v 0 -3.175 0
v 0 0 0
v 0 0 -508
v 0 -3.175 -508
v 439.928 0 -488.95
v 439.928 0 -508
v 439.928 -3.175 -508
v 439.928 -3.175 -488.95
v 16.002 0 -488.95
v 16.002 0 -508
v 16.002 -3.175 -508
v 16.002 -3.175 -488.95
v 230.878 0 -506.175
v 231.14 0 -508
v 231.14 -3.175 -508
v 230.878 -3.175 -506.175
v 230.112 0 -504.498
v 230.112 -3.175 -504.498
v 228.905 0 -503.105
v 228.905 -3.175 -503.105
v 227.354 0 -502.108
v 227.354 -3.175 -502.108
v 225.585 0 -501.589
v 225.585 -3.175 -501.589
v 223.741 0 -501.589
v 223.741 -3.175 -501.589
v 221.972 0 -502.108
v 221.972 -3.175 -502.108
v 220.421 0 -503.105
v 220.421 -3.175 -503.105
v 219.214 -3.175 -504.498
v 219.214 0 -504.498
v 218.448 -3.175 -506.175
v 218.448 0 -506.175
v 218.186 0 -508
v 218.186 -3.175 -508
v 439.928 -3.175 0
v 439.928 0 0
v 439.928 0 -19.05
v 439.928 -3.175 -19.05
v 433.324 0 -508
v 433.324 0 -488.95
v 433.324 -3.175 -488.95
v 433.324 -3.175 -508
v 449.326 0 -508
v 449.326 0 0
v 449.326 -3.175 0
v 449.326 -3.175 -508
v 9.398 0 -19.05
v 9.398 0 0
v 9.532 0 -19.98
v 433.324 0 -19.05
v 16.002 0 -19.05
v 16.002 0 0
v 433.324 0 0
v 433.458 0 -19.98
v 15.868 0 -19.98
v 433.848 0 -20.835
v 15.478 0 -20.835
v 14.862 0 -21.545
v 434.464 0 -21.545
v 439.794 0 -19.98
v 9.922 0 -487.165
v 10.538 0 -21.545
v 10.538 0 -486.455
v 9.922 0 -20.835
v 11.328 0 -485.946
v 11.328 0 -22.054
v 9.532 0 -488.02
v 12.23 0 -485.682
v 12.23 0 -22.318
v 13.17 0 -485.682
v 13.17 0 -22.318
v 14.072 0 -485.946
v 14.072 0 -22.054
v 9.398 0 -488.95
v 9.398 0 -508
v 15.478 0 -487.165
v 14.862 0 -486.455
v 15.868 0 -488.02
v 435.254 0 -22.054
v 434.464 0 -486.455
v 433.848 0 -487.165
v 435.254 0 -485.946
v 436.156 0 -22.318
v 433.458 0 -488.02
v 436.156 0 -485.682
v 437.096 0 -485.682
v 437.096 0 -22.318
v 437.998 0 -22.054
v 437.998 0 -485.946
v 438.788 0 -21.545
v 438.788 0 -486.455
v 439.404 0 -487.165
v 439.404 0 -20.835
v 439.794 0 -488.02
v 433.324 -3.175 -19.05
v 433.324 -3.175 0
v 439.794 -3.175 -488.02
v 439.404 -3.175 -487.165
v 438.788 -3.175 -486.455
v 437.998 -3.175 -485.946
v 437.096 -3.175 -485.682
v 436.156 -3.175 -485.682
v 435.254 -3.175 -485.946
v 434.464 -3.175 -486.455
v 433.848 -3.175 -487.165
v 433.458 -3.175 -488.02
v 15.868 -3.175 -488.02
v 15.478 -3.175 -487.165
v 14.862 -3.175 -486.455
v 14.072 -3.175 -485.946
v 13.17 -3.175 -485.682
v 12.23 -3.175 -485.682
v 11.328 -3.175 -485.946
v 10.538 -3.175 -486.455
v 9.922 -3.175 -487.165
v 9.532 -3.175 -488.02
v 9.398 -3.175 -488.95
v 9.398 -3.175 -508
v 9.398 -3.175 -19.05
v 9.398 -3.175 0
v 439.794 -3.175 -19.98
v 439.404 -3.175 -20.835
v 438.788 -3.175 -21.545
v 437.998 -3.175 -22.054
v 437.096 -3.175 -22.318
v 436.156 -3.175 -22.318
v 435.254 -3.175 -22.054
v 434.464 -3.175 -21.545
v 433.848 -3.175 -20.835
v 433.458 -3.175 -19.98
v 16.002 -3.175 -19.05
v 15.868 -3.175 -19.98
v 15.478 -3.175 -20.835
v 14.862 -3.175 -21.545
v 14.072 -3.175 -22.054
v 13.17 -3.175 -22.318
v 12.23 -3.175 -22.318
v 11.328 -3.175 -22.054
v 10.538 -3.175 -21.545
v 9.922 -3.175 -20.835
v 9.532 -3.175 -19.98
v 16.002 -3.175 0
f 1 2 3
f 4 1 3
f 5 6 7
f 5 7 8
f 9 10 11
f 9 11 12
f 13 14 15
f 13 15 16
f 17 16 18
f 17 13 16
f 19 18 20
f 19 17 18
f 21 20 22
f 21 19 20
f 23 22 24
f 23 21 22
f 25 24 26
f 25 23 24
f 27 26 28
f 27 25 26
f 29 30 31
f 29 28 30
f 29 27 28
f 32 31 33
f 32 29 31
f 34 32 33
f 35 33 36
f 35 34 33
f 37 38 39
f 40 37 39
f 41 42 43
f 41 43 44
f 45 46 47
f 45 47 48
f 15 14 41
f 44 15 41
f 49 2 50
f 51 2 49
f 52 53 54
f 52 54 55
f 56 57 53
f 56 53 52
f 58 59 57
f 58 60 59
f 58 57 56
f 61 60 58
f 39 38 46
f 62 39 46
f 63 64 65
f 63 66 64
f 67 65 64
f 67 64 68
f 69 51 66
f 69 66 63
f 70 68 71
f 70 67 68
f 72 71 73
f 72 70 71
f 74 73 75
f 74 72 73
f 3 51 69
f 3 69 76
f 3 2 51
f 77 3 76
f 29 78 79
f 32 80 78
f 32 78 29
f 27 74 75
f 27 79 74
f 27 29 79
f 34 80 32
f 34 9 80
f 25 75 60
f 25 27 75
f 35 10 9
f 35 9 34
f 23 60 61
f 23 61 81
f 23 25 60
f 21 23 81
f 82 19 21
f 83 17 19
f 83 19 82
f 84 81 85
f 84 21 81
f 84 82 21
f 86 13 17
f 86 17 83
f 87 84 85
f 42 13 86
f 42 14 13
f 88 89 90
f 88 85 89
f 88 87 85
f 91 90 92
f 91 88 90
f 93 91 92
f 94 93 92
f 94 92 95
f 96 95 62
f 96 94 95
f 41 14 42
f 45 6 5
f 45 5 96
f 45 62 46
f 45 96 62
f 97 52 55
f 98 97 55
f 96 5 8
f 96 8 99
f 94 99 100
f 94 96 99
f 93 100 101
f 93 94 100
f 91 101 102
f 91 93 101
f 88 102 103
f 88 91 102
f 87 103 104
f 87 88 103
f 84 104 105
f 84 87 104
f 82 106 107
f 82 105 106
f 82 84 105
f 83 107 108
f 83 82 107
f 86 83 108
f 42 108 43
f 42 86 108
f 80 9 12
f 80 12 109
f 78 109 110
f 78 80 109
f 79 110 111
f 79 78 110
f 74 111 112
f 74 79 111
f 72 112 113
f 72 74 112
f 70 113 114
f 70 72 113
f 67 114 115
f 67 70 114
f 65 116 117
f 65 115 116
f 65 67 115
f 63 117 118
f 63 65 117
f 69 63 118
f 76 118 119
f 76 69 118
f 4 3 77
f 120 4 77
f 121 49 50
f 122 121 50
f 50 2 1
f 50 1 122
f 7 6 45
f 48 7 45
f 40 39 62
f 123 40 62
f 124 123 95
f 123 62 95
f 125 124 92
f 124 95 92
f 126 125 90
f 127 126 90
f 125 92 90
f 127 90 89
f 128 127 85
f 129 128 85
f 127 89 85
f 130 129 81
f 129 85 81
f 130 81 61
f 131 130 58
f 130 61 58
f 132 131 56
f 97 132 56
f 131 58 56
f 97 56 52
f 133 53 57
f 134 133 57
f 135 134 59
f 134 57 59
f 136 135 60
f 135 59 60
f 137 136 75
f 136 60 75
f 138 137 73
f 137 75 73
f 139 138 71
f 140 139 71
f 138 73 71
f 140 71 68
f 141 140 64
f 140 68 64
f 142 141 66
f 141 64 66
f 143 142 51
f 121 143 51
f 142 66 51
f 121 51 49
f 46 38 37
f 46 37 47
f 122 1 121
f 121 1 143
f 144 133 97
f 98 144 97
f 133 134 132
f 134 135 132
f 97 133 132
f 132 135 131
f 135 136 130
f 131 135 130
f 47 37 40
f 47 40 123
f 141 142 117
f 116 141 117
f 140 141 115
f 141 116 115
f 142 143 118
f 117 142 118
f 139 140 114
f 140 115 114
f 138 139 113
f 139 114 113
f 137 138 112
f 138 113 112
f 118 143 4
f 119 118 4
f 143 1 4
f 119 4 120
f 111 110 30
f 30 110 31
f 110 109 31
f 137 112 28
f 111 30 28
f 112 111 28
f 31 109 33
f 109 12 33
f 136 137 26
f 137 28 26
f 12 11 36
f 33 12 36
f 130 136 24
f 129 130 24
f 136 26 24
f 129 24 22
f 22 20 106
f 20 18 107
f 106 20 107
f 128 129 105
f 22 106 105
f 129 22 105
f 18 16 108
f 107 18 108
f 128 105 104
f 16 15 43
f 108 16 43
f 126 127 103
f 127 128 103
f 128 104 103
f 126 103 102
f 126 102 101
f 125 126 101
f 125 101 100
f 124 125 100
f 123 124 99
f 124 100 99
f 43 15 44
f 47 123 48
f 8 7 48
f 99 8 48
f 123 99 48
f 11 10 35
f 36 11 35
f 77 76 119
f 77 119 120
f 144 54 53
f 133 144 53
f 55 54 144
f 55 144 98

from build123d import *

# Parameters (mm, degrees)
SKETCH1_W          = 449.326
SKETCH1_H          = 508
BASE_FLANGE1_DEPTH = 3.175
CUT_EXTRUDE1_DEPTH = 679.209359196


# Sheet-metal steps are written as plain solids
with BuildPart() as part:
    # Sketch1 → Base-Flange1 (new body)
    with BuildSketch(Plane(origin=(0, 0, 0), x_dir=(1, 0, 0), z_dir=(0, 1, 0))):
        with Locations((224.663, 254)):
            Rectangle(SKETCH1_W, SKETCH1_H)
    extrude(amount=-BASE_FLANGE1_DEPTH)

    # Sketch6 → Cut-Extrude1 (cut, through all)
    with BuildSketch(Plane(origin=(0, 0, 0), x_dir=(1, 0, 0), z_dir=(0, 1, 0))):
        with BuildLine():
            Line((9.398, 19.05), (9.398, 0))
            Line((9.398, 0), (16.002, 0))
            Line((16.002, 0), (16.002, 19.05))
            ThreePointArc((16.002, 19.05), (12.7, 22.352), (9.398, 19.05))
        make_face()
        with BuildLine():
            Line((433.324, 19.05), (433.324, 0))
            Line((433.324, 0), (439.928, 0))
            Line((439.928, 0), (439.928, 19.05))
            ThreePointArc((439.928, 19.05), (436.626, 22.352), (433.324, 19.05))
        make_face()
        with BuildLine():
            Line((9.398, 488.95), (9.398, 508))
            Line((9.398, 508), (16.002, 508))
            Line((16.002, 508), (16.002, 488.95))
            ThreePointArc((16.002, 488.95), (12.7, 485.648), (9.398, 488.95))
        make_face()
        with BuildLine():
            Line((433.324, 488.95), (433.324, 508))
            Line((433.324, 508), (439.928, 508))
            Line((439.928, 508), (439.928, 488.95))
            ThreePointArc((439.928, 488.95), (436.626, 485.648), (433.324, 488.95))
        make_face()
        with BuildLine():
            Line((218.186, 508), (231.14, 508))
            ThreePointArc((231.14, 508), (224.663, 501.523), (218.186, 508))
        make_face()
    extrude(amount=-CUT_EXTRUDE1_DEPTH, mode=Mode.SUBTRACT)


solid = part.part
